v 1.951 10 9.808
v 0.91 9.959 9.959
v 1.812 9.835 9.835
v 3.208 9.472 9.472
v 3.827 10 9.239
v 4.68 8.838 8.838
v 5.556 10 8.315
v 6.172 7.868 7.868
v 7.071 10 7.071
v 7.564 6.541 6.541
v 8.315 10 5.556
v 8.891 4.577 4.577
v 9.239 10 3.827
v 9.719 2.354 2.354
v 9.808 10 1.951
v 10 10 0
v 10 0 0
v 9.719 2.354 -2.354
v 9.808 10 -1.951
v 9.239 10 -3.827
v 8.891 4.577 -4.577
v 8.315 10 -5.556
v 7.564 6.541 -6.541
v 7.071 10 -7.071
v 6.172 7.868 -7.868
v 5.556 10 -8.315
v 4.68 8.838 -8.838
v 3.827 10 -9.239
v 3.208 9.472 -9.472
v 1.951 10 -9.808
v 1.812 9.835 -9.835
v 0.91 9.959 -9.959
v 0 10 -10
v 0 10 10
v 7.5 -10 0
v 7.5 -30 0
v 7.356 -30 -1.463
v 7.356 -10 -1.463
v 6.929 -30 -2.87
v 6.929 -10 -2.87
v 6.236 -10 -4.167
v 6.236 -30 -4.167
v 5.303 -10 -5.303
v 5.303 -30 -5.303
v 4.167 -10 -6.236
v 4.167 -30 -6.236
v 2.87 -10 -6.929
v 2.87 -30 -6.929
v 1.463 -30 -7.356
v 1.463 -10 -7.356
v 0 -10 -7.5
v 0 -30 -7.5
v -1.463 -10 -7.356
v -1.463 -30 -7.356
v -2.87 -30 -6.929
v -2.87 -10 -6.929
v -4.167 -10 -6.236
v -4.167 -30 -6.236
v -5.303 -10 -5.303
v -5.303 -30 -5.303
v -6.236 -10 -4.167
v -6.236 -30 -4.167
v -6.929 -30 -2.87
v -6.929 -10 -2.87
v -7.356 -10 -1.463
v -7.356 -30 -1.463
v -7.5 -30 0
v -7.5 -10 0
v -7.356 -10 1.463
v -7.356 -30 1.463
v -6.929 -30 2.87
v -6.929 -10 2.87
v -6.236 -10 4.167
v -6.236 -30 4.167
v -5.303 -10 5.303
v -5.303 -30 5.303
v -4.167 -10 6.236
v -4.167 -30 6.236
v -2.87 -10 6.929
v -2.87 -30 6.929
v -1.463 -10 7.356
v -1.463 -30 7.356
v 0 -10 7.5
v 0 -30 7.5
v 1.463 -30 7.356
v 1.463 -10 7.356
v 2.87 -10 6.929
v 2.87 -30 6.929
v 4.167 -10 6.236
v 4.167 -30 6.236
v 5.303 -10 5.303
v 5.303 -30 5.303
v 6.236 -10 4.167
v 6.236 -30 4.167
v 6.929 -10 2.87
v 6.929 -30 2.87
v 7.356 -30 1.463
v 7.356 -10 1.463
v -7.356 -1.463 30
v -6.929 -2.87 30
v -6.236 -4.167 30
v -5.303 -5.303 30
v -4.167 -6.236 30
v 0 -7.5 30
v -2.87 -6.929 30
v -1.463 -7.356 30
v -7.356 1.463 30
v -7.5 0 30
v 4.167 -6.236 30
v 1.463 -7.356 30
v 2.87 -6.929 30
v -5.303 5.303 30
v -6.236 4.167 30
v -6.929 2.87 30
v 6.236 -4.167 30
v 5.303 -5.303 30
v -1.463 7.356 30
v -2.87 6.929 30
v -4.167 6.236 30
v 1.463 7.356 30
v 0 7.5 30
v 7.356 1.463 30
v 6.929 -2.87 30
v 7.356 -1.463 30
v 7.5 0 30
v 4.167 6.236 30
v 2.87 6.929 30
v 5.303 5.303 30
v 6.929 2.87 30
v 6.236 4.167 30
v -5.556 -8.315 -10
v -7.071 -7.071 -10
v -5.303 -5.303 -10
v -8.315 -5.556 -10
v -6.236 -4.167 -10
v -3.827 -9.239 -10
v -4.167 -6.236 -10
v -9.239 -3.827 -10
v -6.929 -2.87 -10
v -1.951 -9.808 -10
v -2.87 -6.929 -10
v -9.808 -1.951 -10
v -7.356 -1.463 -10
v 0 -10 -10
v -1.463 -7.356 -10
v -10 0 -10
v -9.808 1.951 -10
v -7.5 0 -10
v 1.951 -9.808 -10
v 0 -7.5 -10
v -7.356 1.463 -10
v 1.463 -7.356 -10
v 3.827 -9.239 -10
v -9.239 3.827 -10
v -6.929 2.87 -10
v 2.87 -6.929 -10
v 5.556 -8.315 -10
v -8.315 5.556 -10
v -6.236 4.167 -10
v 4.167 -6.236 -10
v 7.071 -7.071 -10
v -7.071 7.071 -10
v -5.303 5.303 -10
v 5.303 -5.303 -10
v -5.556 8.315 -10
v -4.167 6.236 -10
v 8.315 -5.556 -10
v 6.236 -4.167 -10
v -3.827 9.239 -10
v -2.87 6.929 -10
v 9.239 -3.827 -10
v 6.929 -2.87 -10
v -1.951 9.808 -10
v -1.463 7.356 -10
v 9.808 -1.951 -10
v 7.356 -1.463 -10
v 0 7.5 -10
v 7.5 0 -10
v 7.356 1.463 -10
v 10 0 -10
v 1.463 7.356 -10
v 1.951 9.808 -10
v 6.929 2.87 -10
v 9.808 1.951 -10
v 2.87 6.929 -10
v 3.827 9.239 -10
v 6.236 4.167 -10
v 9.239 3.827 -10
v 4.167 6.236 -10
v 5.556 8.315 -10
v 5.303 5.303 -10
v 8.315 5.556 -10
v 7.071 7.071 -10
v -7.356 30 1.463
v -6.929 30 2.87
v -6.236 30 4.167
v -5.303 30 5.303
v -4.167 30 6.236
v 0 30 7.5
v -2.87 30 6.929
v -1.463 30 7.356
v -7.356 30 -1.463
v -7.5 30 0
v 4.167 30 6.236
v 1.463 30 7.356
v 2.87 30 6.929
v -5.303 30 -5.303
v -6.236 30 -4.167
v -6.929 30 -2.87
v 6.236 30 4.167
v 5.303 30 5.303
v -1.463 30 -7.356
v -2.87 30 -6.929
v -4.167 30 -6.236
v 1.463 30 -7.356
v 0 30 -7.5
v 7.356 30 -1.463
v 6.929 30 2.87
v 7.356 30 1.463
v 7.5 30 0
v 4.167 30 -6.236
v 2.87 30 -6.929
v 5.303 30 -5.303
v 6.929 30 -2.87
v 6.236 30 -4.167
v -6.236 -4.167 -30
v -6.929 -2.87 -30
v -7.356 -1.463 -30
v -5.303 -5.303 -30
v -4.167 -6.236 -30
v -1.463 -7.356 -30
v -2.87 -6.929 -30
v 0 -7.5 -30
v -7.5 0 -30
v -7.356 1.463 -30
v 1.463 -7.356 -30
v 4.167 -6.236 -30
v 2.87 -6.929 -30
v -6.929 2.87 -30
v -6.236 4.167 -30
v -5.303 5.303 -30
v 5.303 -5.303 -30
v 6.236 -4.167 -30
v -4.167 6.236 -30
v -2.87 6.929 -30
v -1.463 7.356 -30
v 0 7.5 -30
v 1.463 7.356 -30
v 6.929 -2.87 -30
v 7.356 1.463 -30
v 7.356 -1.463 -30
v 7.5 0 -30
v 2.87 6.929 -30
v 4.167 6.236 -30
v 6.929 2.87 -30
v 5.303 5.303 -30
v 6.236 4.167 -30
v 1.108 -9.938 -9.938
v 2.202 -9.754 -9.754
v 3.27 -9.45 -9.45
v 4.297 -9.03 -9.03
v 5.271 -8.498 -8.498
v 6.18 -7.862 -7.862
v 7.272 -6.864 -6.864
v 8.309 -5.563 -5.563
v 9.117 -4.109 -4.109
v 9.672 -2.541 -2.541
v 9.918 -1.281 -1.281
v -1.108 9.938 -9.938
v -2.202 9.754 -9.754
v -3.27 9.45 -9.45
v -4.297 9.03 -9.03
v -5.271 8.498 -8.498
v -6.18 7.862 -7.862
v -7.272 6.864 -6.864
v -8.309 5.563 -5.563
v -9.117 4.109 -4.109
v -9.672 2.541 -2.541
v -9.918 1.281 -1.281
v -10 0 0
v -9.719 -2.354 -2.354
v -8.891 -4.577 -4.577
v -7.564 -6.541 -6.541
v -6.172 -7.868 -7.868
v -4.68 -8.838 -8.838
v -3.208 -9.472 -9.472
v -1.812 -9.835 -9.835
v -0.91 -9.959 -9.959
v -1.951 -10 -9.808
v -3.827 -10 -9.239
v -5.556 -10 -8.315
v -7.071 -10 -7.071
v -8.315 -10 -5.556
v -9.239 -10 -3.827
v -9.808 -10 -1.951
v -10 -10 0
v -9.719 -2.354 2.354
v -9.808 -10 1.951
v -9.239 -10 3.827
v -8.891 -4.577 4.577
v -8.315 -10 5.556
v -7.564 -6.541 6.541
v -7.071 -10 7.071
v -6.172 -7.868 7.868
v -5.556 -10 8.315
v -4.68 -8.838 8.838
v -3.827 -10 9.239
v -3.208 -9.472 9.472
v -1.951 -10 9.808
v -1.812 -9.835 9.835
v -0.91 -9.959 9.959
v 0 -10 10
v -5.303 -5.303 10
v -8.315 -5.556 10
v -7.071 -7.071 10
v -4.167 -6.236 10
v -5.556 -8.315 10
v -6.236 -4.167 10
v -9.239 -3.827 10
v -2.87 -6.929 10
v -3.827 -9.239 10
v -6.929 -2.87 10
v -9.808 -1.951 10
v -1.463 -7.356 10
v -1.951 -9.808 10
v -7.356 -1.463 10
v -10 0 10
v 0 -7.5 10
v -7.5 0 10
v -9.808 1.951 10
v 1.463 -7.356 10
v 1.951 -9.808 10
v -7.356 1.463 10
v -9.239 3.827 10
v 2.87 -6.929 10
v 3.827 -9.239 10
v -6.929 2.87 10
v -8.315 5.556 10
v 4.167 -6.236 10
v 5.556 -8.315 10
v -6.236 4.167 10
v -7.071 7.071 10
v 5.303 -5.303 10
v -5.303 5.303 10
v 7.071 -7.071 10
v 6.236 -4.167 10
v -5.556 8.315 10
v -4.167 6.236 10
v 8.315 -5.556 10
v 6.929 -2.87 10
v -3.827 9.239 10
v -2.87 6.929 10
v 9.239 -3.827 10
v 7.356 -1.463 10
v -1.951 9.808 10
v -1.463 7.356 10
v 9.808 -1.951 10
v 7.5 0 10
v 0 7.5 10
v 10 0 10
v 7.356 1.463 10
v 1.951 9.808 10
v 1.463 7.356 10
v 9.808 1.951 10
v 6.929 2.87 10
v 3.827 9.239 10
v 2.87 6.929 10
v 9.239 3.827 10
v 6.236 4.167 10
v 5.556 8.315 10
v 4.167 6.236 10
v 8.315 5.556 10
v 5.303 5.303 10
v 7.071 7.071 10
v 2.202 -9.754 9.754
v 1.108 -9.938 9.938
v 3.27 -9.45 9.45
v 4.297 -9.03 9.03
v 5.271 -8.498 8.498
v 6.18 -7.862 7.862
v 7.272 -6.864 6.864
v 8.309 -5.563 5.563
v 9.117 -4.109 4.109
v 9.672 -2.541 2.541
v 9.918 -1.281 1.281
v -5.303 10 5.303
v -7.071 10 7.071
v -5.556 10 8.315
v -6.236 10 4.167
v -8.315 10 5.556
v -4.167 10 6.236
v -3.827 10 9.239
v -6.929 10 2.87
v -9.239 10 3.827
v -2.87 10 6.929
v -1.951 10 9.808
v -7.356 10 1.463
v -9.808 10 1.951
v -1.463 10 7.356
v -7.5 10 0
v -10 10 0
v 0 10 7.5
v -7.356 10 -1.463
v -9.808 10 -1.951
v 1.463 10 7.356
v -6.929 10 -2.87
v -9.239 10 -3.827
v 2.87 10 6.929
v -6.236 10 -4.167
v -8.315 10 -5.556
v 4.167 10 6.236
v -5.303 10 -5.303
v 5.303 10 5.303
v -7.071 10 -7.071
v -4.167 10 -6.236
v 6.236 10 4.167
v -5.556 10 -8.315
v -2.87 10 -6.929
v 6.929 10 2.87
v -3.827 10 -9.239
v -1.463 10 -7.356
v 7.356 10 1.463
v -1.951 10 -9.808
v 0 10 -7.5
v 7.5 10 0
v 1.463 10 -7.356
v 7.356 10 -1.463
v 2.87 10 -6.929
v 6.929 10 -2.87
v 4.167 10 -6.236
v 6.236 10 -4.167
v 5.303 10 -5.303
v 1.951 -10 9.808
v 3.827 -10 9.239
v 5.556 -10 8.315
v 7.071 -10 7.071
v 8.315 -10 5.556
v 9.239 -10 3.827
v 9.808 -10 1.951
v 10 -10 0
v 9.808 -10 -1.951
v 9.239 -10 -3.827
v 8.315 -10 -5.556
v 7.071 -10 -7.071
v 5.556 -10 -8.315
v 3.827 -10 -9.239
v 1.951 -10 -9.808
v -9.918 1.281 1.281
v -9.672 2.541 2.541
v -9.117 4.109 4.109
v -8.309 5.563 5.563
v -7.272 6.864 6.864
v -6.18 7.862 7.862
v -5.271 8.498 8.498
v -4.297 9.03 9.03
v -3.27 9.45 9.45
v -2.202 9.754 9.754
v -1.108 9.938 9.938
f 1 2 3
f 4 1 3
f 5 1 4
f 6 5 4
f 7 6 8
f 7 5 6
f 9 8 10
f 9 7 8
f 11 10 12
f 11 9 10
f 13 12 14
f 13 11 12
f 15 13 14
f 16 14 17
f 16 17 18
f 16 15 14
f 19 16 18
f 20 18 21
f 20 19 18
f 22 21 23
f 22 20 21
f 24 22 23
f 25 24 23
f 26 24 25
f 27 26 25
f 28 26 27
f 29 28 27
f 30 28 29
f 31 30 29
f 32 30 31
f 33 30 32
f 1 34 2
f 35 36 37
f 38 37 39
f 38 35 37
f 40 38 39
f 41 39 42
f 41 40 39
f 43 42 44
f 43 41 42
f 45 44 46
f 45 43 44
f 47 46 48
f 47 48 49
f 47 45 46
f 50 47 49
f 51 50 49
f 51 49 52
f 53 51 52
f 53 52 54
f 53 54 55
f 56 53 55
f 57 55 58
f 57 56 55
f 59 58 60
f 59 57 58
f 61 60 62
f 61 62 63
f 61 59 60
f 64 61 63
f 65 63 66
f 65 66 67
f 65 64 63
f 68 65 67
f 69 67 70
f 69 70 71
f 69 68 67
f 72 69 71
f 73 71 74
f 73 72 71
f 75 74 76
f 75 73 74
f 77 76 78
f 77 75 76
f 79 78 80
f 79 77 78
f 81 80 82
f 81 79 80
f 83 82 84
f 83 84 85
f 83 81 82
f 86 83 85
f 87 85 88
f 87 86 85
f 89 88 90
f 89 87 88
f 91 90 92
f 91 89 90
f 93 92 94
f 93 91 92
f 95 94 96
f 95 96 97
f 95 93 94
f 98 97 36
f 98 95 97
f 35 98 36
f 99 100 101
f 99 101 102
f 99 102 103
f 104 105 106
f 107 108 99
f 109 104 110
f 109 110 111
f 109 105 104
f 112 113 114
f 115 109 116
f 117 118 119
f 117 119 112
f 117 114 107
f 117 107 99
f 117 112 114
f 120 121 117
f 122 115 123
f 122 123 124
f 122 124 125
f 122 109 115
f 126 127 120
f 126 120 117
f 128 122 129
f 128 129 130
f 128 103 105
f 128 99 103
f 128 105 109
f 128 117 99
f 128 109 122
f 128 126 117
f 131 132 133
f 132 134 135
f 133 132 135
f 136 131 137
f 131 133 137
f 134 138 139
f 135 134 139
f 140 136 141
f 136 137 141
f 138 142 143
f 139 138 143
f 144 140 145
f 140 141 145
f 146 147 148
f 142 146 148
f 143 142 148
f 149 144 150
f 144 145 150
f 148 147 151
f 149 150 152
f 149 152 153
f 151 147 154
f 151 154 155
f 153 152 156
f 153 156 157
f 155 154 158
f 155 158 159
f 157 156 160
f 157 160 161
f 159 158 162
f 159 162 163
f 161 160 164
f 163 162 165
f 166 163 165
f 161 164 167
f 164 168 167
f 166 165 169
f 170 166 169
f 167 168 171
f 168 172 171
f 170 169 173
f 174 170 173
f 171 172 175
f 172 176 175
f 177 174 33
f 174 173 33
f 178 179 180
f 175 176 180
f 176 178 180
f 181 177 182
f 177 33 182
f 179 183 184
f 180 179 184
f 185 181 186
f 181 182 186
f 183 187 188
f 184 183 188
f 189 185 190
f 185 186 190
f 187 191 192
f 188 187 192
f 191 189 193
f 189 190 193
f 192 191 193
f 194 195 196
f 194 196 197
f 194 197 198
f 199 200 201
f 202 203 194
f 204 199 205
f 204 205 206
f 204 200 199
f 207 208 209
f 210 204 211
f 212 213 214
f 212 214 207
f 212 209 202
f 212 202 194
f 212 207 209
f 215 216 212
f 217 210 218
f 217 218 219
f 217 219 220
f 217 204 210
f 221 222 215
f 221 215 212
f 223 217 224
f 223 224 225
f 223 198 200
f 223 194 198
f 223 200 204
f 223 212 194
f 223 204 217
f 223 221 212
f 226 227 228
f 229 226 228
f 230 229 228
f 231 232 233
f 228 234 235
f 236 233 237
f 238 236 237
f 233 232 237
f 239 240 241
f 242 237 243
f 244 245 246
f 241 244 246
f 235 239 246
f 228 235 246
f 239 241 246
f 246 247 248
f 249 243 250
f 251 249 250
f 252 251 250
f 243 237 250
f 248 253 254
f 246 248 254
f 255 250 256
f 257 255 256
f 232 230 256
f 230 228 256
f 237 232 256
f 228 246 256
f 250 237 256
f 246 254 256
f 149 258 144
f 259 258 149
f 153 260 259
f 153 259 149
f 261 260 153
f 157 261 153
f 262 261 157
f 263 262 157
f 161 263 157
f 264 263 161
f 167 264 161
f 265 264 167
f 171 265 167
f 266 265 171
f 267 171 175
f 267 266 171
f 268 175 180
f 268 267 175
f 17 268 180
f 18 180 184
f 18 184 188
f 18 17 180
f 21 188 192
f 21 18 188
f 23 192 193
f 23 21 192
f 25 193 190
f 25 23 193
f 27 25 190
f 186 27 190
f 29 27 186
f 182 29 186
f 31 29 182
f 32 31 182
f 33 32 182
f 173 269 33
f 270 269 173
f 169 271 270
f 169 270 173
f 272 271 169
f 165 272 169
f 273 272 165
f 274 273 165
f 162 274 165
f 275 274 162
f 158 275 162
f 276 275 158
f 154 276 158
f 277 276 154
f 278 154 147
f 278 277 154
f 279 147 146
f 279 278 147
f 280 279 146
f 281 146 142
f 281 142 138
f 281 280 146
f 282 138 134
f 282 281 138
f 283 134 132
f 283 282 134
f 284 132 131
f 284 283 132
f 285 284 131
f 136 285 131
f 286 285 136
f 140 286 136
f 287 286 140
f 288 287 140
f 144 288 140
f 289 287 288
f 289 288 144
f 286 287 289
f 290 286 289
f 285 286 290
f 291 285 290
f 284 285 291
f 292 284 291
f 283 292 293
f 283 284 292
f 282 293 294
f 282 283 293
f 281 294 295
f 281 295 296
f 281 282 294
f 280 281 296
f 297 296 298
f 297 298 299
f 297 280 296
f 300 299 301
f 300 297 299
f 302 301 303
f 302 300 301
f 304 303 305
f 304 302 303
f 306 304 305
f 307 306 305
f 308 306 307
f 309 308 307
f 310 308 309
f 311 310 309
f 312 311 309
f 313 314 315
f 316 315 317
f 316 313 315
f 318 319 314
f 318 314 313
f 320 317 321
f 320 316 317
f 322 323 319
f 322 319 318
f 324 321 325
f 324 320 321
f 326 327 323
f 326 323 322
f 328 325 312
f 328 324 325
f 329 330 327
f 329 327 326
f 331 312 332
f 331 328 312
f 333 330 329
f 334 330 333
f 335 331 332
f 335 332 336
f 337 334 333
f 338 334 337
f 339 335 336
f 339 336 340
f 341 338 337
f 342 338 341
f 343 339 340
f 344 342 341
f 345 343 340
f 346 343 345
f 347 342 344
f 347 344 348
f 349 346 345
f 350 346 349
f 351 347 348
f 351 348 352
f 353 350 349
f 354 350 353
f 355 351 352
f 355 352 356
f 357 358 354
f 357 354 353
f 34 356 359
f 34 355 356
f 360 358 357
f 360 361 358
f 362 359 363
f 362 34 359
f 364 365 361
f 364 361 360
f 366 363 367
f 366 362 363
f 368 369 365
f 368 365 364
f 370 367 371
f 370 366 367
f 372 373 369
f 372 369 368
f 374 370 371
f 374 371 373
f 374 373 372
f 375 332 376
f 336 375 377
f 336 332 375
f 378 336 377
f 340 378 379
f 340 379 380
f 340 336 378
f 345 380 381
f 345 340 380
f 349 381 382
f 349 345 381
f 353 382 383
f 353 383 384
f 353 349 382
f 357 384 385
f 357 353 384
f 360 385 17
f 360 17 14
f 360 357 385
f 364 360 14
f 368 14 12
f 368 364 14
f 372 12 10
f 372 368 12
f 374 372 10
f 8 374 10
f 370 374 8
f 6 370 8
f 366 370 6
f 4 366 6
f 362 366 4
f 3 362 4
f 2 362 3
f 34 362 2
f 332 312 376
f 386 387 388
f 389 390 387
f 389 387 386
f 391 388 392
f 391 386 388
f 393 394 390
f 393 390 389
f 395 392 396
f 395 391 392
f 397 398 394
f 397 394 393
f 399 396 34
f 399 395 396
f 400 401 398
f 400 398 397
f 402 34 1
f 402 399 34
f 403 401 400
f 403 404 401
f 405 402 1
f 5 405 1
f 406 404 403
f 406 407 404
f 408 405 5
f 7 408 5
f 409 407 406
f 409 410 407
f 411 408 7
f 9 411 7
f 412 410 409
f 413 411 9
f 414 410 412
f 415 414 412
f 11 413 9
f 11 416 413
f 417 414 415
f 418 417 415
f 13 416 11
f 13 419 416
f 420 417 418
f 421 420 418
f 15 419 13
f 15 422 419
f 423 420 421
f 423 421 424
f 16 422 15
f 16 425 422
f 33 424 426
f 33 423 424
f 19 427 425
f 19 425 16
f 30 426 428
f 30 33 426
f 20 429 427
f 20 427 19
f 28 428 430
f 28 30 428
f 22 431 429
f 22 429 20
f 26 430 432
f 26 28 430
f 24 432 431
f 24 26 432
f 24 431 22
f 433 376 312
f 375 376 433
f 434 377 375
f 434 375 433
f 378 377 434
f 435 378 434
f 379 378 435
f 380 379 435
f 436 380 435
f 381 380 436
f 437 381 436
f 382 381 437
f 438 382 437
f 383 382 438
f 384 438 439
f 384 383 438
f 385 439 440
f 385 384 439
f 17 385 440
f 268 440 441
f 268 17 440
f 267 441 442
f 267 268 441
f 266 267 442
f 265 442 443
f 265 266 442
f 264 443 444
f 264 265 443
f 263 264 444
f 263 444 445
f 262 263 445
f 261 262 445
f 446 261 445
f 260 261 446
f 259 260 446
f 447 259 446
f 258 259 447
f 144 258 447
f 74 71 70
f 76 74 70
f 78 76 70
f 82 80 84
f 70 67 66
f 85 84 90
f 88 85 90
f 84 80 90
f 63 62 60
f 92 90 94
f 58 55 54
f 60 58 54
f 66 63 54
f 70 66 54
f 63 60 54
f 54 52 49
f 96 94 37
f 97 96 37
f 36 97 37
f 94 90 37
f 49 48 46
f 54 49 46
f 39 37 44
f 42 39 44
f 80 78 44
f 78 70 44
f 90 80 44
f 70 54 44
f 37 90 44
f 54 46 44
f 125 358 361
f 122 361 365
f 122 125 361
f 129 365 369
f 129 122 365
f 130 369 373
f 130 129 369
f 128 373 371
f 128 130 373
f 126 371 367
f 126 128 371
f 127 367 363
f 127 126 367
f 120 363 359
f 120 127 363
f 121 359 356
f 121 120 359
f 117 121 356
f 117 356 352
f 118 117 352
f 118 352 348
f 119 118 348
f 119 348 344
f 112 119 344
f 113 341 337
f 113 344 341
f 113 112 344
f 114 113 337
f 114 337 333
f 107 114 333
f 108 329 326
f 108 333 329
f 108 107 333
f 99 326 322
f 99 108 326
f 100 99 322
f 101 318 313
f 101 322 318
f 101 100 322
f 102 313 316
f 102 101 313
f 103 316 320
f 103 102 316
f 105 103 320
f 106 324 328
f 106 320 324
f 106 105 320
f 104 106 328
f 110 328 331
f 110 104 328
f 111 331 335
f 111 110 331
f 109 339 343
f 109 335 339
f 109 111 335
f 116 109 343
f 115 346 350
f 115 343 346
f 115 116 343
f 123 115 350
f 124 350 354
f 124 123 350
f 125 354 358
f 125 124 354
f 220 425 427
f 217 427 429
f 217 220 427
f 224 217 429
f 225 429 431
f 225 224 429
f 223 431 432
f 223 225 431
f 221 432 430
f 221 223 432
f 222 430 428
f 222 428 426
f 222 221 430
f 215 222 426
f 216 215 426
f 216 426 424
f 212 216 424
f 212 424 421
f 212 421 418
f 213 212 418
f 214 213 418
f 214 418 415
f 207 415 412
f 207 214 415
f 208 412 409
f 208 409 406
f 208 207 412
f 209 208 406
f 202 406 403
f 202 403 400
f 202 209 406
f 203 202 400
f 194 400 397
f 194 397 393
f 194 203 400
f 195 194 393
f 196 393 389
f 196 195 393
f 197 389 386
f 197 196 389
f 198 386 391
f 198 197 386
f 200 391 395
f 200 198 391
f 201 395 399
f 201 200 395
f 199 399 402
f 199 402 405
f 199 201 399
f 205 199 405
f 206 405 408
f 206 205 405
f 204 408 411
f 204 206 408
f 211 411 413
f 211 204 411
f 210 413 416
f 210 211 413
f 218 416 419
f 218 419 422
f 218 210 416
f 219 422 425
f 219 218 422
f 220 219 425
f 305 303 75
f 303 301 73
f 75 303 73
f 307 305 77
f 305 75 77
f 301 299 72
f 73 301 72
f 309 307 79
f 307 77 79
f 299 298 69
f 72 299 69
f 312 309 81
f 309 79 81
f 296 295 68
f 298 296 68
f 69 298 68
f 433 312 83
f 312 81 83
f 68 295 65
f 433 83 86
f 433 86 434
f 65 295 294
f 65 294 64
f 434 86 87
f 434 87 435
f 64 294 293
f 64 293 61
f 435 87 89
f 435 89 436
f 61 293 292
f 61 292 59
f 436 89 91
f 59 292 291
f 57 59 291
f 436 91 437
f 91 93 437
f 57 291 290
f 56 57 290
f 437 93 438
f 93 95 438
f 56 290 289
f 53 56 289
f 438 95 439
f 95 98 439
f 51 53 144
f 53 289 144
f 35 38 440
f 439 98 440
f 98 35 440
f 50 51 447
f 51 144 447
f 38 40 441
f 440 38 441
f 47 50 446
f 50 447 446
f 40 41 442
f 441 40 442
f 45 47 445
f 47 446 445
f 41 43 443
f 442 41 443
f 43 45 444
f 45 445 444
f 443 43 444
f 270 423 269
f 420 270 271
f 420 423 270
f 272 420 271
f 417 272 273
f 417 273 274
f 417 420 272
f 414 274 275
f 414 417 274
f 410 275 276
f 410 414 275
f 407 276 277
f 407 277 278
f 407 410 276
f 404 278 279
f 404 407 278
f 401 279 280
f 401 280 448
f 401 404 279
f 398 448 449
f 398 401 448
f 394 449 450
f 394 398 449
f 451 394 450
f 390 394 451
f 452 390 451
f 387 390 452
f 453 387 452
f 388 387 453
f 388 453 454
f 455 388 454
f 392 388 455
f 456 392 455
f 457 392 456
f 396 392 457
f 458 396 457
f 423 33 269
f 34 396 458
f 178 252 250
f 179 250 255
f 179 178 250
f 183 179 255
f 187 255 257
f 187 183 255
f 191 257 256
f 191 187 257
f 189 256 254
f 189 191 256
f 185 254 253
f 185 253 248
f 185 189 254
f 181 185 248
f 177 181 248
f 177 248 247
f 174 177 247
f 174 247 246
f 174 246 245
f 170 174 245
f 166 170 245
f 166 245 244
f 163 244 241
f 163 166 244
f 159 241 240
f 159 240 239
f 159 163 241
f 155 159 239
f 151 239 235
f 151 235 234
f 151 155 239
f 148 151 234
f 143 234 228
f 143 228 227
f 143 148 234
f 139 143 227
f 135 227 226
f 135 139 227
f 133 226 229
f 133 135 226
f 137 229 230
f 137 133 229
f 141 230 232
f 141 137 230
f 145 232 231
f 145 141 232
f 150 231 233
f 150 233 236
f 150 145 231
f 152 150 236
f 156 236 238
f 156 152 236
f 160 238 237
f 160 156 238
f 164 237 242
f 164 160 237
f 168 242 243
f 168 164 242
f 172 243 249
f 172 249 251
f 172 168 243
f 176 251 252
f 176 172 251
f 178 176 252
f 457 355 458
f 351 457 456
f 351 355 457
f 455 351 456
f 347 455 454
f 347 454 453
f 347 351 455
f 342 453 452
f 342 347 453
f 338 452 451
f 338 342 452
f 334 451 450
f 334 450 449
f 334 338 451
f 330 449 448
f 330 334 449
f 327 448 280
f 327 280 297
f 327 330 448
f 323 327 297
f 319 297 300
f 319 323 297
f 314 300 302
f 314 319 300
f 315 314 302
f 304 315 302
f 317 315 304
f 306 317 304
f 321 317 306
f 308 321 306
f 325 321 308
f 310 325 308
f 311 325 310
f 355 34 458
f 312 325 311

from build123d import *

# Parameters (mm, degrees)
SKETCH1_R           = 10
BOSS_EXTRUDE1_DEPTH = 10
SKETCH2_R           = 7.5
BOSS_EXTRUDE2_DEPTH = 30
SKETCH3_R           = 10
BOSS_EXTRUDE3_DEPTH = 10
SKETCH4_R           = 7.5
BOSS_EXTRUDE4_DEPTH = 30


with BuildPart() as part:
    # Sketch1 → Boss-Extrude1 (new body, symmetric)
    with BuildSketch(Plane.XY):
        Circle(SKETCH1_R)
    extrude(amount=BOSS_EXTRUDE1_DEPTH, both=True)

    # Sketch2 → Boss-Extrude2 (add, symmetric)
    with BuildSketch(Plane.XY):
        Circle(SKETCH2_R)
    extrude(amount=BOSS_EXTRUDE2_DEPTH, both=True)

    # Sketch3 → Boss-Extrude3 (add, symmetric)
    with BuildSketch(Plane(origin=(0, 0, 0), x_dir=(1, 0, 0), z_dir=(0, 1, 0))):
        Circle(SKETCH3_R)
    extrude(amount=BOSS_EXTRUDE3_DEPTH, both=True)

    # Sketch4 → Boss-Extrude4 (add, symmetric)
    with BuildSketch(Plane(origin=(0, 0, 0), x_dir=(1, 0, 0), z_dir=(0, 1, 0))):
        Circle(SKETCH4_R)
    extrude(amount=BOSS_EXTRUDE4_DEPTH, both=True)


solid = part.part
